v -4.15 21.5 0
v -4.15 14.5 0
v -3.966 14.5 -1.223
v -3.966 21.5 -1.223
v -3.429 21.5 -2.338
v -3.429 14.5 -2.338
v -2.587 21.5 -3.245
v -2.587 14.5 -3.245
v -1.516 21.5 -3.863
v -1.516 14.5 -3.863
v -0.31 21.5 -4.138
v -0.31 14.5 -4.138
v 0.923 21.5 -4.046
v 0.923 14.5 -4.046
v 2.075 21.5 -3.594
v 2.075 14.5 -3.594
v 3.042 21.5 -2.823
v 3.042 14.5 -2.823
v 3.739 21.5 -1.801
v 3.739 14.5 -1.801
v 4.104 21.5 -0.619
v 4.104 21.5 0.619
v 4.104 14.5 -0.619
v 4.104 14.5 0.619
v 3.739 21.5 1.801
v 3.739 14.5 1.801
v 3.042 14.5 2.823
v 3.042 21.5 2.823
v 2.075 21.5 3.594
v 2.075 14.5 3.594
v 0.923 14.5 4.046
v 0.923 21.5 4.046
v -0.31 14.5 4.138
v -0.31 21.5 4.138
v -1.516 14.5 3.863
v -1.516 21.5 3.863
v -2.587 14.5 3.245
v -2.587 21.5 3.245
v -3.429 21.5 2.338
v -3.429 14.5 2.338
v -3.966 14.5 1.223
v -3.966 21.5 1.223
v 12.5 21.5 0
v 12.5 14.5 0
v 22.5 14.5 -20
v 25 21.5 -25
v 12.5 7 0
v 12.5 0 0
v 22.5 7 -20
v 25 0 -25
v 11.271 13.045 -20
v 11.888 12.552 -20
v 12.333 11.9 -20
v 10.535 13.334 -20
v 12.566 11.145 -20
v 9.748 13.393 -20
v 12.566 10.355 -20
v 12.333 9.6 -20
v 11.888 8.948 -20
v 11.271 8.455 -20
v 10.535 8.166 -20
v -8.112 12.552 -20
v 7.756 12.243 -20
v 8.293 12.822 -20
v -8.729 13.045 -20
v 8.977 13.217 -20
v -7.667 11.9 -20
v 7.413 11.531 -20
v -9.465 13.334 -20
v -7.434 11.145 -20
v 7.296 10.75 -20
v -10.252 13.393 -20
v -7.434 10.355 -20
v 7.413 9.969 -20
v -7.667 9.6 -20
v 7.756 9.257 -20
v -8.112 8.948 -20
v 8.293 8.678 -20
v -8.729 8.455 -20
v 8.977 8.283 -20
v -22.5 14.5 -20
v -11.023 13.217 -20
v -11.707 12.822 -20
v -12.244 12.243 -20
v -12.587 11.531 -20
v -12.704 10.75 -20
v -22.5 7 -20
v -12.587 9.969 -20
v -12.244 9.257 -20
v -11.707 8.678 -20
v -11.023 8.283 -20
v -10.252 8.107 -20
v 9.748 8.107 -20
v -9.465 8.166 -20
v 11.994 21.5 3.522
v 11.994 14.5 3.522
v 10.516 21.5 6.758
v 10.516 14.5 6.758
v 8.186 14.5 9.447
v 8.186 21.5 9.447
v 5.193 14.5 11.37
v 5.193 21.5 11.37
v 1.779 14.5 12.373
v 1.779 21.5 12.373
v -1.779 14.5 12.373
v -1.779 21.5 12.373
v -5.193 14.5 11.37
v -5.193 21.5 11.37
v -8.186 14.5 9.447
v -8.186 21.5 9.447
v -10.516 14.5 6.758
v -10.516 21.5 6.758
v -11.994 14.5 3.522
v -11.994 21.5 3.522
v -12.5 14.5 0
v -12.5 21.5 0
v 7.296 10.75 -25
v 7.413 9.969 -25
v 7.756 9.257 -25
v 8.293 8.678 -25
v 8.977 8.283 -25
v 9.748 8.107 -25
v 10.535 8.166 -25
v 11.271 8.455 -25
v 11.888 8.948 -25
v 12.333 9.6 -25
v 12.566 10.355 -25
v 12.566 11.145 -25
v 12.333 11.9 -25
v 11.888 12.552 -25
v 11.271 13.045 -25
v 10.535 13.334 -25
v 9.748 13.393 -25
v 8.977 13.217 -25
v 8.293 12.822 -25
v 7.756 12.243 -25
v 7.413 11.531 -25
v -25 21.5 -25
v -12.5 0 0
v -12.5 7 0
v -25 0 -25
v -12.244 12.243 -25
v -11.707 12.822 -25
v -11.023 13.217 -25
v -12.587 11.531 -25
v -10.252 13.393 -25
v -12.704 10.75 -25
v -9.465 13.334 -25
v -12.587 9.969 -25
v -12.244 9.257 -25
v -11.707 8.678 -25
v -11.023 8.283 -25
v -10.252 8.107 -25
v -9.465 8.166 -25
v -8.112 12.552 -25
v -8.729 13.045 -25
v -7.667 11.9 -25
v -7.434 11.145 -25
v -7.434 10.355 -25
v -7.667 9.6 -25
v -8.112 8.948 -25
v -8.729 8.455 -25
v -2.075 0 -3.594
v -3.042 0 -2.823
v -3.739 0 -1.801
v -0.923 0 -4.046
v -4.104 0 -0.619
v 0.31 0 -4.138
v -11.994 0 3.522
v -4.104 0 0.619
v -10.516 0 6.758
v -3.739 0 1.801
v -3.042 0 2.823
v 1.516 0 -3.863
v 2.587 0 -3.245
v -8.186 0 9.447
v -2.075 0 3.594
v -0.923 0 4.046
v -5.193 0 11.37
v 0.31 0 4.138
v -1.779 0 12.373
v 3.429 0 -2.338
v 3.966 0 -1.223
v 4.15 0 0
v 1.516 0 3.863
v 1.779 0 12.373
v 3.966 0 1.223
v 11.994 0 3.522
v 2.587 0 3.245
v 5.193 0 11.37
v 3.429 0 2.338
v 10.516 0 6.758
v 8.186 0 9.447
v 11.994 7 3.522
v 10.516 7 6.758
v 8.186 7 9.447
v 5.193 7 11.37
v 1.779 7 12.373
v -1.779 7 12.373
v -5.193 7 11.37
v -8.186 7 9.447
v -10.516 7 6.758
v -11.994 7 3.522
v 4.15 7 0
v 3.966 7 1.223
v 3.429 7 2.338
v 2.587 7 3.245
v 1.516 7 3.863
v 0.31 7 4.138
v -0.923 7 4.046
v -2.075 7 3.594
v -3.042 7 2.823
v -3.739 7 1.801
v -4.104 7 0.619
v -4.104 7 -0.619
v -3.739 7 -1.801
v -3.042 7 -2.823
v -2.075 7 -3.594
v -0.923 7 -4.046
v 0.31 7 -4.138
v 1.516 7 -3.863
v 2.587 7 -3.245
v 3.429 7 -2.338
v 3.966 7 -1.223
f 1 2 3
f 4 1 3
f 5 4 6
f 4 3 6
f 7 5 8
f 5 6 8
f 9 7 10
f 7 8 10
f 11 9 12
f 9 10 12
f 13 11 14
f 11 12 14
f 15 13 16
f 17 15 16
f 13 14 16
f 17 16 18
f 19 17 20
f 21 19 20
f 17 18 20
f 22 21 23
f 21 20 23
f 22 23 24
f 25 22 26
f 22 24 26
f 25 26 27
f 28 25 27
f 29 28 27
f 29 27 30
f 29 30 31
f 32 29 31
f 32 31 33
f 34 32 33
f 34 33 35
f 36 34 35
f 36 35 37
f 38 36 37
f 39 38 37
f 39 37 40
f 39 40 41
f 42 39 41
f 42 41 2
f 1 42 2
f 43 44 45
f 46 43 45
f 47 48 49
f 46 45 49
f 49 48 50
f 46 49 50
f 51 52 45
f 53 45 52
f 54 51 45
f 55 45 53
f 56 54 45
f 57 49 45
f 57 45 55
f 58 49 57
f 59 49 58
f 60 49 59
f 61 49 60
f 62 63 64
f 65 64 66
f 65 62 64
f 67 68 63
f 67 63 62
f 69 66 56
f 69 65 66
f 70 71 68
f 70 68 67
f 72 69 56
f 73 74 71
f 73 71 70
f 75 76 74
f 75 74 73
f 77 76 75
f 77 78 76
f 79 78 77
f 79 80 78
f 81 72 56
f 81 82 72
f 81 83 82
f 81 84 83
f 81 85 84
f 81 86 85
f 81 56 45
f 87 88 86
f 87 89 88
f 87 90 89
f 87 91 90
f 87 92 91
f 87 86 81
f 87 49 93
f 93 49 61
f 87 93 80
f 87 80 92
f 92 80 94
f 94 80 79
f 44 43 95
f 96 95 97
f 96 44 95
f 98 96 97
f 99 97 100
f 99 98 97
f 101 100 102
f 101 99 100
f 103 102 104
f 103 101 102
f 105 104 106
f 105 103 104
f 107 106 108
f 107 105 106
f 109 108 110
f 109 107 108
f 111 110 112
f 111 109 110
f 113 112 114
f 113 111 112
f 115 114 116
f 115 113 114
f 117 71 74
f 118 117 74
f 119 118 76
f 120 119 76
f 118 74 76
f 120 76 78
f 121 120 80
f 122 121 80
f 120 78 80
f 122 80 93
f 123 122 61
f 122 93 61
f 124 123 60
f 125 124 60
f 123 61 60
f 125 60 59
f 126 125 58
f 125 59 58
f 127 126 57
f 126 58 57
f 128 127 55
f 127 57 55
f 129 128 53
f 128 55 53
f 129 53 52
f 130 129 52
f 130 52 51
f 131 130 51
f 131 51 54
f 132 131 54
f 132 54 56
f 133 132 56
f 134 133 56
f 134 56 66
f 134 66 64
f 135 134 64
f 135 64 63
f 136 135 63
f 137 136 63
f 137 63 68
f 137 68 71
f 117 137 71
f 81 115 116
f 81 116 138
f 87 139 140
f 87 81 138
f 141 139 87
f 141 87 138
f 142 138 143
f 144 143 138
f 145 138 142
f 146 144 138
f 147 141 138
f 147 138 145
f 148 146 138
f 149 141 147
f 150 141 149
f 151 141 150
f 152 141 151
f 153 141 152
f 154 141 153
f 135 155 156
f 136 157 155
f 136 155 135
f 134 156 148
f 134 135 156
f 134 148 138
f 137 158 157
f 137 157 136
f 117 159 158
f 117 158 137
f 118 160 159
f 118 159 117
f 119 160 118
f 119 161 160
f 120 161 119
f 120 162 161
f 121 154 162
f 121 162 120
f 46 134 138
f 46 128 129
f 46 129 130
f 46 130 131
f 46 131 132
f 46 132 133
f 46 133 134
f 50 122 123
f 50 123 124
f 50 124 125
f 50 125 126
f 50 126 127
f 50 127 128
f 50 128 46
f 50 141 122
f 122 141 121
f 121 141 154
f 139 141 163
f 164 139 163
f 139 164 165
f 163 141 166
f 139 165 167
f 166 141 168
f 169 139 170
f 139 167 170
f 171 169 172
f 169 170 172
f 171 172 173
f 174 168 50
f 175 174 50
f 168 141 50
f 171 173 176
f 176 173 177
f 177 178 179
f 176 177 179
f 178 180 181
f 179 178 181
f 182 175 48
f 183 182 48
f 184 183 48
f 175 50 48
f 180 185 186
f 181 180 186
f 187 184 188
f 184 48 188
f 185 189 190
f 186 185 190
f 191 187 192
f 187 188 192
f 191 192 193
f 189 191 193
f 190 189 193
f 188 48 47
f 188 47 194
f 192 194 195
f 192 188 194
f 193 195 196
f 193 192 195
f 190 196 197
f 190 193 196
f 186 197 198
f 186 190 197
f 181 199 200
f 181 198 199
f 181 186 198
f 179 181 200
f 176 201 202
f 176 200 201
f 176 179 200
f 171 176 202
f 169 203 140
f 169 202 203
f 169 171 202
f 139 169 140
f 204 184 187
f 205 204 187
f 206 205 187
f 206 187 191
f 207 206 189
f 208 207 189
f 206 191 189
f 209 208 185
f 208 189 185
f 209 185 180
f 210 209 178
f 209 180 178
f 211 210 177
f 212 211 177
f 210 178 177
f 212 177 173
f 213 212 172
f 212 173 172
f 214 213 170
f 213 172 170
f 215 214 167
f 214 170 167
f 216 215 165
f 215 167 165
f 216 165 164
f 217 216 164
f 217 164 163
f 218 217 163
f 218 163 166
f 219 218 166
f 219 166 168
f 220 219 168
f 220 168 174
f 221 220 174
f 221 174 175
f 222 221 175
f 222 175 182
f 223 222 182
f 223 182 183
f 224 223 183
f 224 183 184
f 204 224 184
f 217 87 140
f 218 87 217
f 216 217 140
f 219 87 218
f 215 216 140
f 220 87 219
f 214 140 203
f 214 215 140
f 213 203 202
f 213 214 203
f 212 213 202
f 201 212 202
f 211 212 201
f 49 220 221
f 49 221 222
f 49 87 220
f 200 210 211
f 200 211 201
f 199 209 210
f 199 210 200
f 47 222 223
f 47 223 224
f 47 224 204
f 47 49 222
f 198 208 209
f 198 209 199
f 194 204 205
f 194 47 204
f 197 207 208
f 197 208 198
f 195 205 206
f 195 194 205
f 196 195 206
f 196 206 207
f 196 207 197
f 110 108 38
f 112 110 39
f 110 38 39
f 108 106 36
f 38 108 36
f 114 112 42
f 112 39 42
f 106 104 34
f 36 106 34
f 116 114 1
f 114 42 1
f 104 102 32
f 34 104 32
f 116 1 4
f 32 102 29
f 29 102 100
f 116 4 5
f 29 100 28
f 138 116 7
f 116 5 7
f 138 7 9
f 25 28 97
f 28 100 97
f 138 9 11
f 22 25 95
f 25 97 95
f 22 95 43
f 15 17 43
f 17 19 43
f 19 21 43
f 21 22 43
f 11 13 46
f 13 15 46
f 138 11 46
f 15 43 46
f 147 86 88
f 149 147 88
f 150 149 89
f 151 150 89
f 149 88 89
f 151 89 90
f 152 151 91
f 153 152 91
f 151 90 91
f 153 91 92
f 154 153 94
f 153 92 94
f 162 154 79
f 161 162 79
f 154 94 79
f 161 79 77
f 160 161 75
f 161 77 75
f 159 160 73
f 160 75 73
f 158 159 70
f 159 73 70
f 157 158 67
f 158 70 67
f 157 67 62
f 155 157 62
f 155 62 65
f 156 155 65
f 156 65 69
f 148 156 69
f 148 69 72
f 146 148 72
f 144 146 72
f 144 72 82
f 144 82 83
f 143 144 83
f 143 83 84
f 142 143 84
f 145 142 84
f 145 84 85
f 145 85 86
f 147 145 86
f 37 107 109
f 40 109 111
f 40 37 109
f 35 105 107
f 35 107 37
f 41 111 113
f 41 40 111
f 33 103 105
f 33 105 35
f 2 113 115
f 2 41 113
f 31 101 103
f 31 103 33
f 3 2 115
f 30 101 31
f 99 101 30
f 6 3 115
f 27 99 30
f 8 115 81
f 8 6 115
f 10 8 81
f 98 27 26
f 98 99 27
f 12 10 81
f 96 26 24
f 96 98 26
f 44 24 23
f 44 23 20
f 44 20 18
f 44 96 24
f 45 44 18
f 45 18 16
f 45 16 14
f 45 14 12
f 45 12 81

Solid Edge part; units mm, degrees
sketch "Sketch1" plane through (0, 0, 0) normal (0, -1, 0) x (1, 0, 0)
  line L0 (12.5, 0) -> (25, -25)
  line L1 (-25, -25) -> (25, -25)
  line L2 (-12.5, 0) -> (-25, -25)
  arc A0 (-12.5, 0) -> (12.5, 0) centre (0, 0) cw
extrude "Protrusion1" add sketch "Sketch1" against normal blind 7
sketch "Sketch2" plane through (0, 0, 0) normal (0, -1, 0) x (1, 0, 0)
  circle A0 centre (0, 0) radius 4.15
extrude "Cutout1" cut sketch "Sketch2" against normal through all
sketch "Sketch3" plane through (0, 7, -6.25) normal (0, 1, 0) x (-1, 0, 0)
  line L0 (-22.5, -13.75) -> (22.5, -13.75)
  line L1 (22.5, -13.75) -> (25, -18.75)
  line L2 (25, -18.75) -> (-25, -18.75)
  line L3 (-25, -18.75) -> (-22.5, -13.75)
extrude "ExtrudedProtrusion_2" add sketch "Sketch3" along normal blind 7.5
sketch "Sketch4" plane through (0, 14.5, -22.5) normal (0, 1, 0) x (-1, 0, 0)
  line L0 (-25, -2.5) -> (-12.5, 22.5)
  line L1 (12.5, 22.5) -> (25, -2.5)
  line L2 (25, -2.5) -> (-25, -2.5)
  arc A0 (-12.5, 22.5) -> (12.5, 22.5) centre (0, 22.5) cw
extrude "ExtrudedProtrusion_3" add sketch "Sketch4" along normal blind 7
sketch "Sketch5" plane through (0, 14.5, -22.5) normal (0, 1, 0) x (-1, 0, 0)
  circle A0 centre (0, 22.5) radius 4.15
extrude "Cutout2" cut sketch "Sketch5" along normal through all
sketch "Sketch6" plane through (0, 10, -20) normal (0, 0, 1) x (-1, 0, 0)
  circle A0 centre (-9.9456, -0.75) radius 2.65
  circle A1 centre (10.0544, -0.75) radius 2.65
  dimension "D1" = 5.3
  dimension "D2" = 5.3
  dimension "D3" = 20
extrude "Cutout3" cut sketch "Sketch6" against normal through all
properties material "PLA"
